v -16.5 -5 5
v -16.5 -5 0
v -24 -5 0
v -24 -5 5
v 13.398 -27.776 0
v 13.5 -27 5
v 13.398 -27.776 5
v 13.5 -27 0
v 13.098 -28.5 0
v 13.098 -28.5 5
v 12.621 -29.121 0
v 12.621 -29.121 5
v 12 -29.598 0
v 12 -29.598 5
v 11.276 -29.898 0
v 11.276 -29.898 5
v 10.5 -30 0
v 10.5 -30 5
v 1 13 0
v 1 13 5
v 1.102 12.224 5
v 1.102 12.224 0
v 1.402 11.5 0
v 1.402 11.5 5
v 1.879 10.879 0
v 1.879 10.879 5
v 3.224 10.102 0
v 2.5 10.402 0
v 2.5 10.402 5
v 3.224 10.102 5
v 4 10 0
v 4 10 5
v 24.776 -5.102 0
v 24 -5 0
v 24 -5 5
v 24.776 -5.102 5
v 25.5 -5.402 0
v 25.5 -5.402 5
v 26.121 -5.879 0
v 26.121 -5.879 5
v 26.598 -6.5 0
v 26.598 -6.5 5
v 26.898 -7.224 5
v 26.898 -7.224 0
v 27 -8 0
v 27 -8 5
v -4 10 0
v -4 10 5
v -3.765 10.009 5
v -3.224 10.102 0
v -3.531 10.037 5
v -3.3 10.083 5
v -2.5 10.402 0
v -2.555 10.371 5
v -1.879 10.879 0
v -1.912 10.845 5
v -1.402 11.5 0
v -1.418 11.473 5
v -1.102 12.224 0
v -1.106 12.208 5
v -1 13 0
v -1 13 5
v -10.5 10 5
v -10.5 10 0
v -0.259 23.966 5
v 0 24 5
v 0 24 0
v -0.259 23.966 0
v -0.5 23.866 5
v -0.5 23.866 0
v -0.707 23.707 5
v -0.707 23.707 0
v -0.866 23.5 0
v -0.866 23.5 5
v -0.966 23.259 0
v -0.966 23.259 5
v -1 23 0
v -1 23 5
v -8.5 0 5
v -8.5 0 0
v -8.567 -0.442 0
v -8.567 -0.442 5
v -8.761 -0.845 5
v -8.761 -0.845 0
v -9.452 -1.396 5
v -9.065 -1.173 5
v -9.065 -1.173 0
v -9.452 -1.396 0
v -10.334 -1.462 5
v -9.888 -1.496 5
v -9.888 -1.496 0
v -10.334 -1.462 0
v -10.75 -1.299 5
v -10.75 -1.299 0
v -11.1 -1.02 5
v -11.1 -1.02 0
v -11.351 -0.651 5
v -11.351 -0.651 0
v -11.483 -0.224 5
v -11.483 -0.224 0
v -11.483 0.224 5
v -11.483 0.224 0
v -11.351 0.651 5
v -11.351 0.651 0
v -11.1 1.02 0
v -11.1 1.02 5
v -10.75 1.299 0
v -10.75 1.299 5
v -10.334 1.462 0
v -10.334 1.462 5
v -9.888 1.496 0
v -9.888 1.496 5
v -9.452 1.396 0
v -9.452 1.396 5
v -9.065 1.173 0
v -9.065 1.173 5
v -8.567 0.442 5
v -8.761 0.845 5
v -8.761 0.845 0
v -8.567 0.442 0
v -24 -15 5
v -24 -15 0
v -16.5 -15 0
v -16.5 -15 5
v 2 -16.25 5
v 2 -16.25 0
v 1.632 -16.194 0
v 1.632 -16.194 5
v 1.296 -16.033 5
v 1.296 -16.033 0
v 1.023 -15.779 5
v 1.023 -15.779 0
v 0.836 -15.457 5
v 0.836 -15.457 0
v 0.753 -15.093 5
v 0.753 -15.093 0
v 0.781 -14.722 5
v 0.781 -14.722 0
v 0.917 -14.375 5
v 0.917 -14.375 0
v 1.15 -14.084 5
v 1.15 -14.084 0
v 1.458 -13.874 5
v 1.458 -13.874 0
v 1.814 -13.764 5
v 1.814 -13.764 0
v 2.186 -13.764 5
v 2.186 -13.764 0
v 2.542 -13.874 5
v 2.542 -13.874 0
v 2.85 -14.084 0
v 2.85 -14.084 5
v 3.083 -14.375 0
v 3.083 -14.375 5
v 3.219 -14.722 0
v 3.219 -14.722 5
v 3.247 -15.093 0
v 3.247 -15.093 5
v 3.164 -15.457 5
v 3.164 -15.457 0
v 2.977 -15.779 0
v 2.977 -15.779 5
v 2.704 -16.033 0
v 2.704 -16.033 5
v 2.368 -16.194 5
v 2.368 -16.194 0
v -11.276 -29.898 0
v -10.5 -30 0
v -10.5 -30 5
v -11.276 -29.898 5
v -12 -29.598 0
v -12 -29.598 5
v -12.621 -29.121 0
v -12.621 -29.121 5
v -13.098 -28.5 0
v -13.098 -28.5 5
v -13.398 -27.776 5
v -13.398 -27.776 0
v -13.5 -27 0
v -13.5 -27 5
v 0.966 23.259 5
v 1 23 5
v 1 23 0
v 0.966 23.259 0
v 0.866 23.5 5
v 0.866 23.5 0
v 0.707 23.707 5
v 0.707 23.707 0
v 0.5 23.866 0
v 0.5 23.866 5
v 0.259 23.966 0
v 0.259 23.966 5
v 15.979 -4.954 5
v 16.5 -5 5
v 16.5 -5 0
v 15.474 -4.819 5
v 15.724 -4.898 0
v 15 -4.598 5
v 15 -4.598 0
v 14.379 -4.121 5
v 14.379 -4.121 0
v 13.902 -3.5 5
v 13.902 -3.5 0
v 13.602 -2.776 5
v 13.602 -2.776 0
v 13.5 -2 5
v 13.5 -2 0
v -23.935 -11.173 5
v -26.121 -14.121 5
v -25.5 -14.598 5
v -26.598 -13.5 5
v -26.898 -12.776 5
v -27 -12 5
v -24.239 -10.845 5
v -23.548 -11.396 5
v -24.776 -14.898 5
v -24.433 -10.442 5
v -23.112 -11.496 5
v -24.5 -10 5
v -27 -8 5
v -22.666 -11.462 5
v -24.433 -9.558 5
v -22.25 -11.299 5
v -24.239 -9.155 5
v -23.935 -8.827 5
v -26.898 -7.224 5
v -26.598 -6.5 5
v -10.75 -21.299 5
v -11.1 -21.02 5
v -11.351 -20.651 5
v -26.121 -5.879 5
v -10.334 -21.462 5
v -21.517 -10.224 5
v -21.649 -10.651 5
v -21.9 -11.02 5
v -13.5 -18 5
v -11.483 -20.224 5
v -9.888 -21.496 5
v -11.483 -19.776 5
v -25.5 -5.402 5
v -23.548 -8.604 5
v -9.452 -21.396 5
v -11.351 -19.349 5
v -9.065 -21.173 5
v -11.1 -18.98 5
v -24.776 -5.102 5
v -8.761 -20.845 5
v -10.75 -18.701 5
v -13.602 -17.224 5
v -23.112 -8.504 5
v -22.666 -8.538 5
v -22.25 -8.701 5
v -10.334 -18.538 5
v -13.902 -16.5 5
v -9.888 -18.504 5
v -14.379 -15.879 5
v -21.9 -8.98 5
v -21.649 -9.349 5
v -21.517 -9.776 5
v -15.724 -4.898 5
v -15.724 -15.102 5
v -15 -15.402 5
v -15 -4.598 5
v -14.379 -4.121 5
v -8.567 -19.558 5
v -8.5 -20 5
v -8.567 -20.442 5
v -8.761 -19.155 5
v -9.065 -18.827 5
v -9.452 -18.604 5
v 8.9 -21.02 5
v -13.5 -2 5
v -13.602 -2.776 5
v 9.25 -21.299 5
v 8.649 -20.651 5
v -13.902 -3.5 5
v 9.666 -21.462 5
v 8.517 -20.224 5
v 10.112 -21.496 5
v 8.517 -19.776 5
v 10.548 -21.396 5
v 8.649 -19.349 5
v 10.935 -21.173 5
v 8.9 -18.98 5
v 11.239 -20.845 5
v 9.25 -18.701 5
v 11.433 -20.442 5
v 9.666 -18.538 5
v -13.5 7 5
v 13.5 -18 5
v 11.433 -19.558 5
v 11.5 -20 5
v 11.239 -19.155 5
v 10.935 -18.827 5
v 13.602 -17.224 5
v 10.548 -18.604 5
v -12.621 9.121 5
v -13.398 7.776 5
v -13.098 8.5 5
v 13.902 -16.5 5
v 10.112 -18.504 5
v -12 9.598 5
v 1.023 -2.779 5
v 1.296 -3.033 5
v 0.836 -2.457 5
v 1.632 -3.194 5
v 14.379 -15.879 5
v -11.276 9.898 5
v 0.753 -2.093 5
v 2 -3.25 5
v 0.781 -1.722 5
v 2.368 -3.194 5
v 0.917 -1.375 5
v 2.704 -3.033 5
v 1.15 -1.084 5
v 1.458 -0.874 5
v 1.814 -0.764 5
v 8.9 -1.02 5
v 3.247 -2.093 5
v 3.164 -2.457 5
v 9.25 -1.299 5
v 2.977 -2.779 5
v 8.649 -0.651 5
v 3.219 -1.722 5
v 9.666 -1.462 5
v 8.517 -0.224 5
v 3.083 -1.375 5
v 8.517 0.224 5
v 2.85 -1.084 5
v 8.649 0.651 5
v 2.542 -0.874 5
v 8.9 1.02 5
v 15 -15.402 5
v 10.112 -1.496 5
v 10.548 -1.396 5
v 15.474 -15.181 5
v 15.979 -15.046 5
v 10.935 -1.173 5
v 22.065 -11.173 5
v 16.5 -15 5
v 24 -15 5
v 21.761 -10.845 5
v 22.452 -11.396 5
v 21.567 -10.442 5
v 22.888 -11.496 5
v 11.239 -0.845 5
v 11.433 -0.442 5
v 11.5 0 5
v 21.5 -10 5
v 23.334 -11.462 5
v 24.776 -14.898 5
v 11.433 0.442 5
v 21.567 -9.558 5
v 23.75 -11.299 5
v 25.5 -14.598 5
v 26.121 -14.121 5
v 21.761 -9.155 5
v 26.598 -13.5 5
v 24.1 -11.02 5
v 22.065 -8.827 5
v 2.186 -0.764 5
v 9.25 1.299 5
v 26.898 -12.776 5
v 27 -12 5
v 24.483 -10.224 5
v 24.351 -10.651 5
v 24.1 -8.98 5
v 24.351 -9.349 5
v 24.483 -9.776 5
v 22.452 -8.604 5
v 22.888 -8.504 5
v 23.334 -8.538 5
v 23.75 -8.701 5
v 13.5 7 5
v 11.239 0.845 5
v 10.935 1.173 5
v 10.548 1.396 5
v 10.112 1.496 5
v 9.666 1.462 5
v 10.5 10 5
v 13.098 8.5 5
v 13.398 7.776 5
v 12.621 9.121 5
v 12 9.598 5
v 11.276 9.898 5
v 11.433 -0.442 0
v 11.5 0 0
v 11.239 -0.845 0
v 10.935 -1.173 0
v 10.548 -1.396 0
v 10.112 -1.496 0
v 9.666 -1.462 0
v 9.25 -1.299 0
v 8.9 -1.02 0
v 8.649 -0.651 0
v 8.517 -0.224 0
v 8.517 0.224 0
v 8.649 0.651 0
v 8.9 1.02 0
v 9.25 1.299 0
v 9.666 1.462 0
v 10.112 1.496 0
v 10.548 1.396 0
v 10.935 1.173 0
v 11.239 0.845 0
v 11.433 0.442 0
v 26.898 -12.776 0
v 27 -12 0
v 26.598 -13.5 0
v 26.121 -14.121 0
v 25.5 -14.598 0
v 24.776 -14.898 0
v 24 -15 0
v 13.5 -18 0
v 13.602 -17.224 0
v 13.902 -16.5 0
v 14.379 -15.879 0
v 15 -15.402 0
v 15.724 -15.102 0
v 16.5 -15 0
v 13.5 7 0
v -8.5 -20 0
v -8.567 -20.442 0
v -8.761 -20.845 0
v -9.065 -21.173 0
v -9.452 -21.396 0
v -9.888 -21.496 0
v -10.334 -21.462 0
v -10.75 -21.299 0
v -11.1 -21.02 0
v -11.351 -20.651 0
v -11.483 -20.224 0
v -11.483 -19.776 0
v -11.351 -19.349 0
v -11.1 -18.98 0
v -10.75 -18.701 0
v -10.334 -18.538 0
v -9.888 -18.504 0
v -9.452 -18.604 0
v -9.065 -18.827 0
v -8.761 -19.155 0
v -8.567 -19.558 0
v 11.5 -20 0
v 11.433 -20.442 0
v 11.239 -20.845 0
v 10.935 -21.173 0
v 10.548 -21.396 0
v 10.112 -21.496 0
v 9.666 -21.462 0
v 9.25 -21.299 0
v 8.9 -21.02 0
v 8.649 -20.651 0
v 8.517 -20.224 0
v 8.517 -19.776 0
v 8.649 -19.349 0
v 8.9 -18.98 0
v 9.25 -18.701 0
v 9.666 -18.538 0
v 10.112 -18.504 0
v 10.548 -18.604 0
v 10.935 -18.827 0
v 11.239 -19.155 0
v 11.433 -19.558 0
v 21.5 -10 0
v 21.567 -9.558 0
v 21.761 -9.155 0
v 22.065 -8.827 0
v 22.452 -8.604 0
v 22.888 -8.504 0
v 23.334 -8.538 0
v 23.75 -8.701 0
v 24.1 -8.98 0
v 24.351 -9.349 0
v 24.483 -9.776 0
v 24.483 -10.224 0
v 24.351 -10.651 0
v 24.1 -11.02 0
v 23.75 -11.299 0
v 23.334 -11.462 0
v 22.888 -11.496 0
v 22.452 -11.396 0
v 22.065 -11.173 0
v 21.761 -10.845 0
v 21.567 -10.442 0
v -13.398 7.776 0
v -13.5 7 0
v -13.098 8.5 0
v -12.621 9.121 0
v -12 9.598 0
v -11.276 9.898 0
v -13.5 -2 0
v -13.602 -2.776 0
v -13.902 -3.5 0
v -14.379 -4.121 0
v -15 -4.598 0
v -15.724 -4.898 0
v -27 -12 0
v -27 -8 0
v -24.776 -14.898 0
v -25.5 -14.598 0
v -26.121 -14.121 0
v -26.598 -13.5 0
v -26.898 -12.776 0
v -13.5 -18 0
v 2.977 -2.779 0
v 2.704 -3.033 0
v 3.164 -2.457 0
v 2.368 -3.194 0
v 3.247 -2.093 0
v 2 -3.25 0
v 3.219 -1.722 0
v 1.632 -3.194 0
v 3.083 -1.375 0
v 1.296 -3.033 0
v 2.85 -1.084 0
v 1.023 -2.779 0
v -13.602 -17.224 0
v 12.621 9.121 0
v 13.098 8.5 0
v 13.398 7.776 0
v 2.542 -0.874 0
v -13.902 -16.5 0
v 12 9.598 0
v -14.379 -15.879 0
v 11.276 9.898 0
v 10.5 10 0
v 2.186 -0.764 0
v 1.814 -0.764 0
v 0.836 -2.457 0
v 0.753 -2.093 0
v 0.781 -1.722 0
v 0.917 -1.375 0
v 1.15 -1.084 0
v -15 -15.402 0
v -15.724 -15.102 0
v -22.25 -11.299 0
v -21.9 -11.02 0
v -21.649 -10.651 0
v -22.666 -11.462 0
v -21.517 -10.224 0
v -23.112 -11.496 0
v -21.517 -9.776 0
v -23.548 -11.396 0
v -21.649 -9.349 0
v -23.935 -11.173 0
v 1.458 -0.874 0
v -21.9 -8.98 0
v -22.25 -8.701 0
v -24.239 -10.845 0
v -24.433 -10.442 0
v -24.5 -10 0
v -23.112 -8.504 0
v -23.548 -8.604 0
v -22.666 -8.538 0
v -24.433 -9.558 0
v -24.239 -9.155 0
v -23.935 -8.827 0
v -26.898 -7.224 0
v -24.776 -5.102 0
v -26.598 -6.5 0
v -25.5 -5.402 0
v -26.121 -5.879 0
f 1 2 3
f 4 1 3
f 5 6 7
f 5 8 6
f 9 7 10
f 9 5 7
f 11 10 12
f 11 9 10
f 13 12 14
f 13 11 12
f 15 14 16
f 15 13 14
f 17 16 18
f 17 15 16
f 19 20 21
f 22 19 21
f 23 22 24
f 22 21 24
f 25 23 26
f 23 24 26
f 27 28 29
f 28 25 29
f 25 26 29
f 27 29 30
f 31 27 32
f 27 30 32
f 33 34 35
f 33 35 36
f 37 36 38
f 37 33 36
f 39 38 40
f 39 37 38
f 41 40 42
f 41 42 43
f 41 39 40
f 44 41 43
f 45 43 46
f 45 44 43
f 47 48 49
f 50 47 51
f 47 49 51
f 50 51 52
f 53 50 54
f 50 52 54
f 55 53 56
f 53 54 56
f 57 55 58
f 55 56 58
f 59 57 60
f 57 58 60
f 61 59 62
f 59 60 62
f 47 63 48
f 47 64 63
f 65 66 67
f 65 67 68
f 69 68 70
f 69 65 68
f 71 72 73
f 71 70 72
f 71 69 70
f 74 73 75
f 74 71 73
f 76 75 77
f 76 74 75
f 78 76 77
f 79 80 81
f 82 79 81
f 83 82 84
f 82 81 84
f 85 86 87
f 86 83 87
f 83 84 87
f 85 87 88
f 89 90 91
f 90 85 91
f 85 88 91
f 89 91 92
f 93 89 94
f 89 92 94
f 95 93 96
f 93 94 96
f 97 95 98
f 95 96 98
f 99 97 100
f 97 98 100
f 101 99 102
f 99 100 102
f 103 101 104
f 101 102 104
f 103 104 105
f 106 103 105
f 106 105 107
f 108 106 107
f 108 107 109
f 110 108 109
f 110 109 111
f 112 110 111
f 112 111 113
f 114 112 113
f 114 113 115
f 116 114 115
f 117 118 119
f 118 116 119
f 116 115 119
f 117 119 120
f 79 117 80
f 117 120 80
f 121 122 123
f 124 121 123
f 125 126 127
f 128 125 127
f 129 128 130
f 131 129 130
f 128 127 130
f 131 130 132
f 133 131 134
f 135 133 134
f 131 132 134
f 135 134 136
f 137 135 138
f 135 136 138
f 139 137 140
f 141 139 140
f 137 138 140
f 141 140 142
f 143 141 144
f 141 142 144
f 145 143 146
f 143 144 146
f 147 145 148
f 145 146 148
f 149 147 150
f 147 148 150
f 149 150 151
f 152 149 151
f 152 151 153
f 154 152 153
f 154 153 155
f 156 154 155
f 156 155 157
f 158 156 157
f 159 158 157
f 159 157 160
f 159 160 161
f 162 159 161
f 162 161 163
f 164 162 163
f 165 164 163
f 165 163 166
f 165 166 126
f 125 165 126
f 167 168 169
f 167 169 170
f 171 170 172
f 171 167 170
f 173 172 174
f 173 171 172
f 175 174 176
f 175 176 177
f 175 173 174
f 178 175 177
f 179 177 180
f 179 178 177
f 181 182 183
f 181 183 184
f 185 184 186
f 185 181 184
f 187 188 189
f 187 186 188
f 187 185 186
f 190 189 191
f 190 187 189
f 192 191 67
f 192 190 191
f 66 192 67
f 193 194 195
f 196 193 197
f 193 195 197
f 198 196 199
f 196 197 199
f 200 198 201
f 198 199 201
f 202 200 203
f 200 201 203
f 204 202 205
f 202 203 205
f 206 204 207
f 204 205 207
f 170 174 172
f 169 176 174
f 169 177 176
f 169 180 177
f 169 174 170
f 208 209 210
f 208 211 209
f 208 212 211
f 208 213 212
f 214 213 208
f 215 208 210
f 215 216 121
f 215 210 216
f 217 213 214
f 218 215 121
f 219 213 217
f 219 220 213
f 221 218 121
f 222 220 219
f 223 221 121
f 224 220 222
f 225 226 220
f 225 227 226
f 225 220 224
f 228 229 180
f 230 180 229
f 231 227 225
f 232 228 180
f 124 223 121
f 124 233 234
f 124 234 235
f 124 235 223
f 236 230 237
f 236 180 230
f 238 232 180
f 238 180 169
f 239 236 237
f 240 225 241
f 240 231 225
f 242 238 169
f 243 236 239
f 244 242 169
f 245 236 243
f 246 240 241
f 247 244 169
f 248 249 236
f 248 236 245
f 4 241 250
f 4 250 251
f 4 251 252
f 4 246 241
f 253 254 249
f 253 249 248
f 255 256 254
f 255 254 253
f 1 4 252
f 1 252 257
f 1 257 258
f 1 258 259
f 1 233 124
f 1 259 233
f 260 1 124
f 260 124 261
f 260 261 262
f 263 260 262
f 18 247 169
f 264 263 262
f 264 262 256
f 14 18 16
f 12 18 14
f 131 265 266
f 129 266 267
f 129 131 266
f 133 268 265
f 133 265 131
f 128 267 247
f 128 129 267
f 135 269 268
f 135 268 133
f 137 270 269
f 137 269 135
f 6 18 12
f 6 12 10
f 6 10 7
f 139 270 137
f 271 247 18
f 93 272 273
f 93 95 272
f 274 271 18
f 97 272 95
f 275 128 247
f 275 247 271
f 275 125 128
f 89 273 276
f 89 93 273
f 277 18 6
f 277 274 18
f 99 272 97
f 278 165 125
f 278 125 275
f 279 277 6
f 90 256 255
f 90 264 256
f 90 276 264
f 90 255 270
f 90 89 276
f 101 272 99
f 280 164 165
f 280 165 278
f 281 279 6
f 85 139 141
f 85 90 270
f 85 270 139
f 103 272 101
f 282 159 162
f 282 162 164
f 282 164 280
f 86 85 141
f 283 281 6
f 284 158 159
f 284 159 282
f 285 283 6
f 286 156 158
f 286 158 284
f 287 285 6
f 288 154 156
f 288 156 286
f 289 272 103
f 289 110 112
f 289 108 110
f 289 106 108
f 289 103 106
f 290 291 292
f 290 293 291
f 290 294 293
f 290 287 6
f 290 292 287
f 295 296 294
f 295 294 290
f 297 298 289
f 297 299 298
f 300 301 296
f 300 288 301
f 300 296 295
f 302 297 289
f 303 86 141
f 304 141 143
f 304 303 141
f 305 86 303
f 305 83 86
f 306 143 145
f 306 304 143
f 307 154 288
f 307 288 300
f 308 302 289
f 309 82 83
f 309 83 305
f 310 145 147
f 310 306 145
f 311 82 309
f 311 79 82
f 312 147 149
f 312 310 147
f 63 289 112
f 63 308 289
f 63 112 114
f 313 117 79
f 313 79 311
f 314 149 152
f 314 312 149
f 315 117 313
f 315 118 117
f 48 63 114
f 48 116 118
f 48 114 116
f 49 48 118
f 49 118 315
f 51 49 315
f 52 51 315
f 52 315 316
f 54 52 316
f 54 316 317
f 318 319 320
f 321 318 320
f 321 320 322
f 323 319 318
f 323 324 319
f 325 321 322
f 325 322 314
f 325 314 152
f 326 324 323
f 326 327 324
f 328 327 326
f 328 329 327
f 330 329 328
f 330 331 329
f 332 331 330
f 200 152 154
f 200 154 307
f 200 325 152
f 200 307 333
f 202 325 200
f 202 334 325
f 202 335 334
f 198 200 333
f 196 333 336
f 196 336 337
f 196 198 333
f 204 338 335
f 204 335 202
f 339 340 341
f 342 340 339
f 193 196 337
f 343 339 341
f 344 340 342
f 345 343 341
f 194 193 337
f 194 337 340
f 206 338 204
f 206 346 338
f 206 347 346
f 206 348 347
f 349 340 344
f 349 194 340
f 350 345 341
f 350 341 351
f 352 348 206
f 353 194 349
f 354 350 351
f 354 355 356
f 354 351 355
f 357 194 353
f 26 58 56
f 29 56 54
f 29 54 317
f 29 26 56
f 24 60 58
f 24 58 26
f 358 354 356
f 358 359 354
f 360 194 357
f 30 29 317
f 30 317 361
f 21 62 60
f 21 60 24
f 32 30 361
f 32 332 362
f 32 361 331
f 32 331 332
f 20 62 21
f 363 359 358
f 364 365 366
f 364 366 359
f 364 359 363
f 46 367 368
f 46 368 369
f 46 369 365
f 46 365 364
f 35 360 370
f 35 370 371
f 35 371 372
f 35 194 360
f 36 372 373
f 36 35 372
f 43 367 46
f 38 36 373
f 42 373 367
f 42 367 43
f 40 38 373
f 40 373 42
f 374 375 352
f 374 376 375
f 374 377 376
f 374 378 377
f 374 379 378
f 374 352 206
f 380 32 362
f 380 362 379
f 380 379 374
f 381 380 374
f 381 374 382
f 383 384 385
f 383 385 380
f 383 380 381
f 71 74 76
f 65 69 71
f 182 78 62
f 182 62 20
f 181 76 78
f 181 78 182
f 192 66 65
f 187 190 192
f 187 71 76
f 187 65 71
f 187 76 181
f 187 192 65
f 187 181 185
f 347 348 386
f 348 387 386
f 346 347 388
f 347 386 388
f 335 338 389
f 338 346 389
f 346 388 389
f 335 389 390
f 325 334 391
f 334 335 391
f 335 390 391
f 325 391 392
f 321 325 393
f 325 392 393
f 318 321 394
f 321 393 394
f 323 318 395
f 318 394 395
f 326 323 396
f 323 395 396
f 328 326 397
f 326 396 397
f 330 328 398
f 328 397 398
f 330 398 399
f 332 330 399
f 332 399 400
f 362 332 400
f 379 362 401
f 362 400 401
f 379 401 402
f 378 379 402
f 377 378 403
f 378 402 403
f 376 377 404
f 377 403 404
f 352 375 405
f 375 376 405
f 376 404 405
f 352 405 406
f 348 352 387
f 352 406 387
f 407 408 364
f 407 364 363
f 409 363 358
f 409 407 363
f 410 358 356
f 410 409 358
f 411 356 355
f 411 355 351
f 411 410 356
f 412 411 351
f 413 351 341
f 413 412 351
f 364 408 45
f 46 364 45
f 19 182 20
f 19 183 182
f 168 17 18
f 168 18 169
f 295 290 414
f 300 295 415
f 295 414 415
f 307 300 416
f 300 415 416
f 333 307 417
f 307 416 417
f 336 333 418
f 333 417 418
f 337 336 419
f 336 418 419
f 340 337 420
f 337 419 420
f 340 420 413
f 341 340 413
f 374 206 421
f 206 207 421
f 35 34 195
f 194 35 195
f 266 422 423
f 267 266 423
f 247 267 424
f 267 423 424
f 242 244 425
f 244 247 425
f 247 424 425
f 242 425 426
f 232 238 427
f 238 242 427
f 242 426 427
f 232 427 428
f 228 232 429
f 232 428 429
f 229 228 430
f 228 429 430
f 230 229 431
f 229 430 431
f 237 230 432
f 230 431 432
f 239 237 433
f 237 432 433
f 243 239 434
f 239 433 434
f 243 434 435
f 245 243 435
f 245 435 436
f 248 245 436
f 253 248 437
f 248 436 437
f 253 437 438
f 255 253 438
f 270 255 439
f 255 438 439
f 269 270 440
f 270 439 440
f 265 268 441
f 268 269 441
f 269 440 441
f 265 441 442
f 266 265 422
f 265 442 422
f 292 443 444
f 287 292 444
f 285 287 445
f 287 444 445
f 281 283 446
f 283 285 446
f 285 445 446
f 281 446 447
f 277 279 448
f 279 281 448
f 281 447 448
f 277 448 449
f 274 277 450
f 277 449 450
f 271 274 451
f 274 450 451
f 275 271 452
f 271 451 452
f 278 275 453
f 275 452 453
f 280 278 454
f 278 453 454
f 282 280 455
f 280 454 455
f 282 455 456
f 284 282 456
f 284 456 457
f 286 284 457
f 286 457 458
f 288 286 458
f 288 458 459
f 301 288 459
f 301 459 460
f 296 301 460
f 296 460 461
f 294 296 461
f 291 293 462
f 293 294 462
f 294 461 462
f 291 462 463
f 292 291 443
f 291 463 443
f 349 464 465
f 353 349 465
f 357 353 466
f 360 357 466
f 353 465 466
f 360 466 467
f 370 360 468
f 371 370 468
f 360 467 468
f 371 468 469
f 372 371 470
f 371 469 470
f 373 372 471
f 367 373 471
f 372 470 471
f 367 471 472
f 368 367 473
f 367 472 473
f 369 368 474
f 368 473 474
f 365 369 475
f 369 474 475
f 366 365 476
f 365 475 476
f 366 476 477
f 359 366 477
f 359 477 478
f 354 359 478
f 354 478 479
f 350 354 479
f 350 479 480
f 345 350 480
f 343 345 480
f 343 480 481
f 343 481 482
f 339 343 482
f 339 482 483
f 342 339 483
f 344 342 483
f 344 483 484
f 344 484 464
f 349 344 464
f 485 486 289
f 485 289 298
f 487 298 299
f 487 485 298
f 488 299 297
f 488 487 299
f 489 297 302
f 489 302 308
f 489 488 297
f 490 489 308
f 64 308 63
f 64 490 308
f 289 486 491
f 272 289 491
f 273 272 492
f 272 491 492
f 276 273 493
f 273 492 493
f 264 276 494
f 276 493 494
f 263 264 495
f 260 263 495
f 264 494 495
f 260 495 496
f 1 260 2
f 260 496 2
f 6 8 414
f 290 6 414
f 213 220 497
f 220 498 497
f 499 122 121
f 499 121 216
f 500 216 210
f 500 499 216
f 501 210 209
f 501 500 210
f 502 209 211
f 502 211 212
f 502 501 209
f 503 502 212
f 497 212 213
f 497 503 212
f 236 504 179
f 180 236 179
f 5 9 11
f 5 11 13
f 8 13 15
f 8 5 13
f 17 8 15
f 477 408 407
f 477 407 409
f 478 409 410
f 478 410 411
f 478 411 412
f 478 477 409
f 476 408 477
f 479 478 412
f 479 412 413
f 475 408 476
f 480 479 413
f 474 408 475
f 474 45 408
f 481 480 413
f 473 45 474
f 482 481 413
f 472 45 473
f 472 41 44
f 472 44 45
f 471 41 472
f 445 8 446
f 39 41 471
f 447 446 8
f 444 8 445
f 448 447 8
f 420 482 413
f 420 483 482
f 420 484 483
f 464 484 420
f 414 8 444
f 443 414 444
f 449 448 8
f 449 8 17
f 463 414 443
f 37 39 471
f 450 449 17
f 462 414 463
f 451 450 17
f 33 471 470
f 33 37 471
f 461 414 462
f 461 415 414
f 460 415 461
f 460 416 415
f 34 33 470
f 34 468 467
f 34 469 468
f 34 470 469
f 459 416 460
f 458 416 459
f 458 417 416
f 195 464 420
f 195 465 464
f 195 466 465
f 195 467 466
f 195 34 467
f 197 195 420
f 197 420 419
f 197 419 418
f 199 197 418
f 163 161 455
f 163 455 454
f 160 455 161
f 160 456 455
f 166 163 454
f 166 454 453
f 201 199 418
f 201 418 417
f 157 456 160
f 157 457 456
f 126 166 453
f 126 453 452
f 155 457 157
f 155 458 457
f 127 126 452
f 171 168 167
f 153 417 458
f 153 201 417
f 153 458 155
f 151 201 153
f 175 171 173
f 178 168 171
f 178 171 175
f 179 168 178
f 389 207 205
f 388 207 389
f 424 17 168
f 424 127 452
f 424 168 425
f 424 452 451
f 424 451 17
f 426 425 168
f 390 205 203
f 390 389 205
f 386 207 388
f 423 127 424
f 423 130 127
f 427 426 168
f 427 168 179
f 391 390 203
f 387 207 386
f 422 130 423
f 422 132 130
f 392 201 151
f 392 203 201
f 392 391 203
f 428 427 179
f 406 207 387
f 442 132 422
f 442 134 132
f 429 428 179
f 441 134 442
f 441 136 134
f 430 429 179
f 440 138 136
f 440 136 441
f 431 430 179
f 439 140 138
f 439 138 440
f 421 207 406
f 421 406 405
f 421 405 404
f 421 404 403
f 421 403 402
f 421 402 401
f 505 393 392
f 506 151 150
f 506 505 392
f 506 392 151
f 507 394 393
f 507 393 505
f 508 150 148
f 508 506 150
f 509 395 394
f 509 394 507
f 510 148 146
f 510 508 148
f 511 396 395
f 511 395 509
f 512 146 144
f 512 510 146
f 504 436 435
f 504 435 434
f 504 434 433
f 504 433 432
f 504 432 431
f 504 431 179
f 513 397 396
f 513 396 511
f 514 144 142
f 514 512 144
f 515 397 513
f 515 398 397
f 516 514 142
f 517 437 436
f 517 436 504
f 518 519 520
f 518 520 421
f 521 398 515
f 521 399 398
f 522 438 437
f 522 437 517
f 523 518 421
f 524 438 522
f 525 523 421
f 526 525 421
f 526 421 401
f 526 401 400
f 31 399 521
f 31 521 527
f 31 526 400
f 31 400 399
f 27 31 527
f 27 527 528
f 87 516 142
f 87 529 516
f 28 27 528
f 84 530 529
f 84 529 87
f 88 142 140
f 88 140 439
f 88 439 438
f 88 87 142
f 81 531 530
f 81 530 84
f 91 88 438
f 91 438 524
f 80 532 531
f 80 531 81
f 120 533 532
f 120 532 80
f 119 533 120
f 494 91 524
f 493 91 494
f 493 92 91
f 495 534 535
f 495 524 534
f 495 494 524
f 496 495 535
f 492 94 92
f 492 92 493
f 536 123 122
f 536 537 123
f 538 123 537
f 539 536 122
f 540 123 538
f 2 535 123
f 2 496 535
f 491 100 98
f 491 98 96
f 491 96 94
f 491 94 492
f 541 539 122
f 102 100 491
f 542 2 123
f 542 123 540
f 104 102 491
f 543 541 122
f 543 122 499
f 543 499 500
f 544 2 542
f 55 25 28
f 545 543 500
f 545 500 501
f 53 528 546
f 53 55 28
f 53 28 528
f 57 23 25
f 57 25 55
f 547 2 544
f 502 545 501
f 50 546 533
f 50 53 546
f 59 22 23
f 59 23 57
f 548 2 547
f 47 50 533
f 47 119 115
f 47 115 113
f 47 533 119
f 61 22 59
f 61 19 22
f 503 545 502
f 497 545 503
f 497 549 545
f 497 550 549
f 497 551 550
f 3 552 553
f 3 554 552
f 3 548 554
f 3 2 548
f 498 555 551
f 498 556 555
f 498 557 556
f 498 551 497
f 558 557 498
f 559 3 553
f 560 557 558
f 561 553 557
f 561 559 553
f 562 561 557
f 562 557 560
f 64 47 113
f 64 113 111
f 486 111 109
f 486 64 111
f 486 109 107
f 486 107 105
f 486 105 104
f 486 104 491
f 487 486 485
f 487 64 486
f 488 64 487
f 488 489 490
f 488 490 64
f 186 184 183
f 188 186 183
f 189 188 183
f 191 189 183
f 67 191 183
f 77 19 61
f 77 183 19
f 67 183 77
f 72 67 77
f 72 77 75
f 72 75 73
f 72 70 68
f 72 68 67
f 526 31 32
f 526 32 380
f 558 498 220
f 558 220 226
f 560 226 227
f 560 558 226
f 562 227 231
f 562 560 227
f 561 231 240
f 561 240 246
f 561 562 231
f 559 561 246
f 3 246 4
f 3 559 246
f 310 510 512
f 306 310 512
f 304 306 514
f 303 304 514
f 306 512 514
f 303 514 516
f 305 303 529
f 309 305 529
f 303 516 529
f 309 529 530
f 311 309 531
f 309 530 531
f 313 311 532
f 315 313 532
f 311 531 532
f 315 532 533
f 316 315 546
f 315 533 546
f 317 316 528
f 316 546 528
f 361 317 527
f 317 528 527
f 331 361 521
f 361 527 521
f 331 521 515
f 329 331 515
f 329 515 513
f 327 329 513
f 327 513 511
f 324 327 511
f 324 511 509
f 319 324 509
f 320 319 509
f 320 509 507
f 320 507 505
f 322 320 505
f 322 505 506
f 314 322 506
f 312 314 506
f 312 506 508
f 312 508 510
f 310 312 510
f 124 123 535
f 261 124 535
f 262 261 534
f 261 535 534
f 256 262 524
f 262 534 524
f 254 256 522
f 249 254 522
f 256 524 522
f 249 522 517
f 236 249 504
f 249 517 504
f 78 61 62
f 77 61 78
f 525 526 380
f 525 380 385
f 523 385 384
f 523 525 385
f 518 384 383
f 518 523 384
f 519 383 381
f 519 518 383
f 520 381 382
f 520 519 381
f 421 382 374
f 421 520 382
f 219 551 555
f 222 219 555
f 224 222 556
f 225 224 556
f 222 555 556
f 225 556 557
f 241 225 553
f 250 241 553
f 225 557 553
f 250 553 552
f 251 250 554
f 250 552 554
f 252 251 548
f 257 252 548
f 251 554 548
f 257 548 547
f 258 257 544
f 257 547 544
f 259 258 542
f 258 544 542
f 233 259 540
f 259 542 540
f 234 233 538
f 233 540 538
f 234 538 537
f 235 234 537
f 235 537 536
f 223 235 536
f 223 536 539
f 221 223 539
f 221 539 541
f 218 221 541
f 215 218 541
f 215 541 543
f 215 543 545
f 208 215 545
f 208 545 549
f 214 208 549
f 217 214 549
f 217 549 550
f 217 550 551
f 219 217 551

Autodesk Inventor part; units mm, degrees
ref_plane "YZ Plane" through (0, 0, 0) normal (1, 0, 0) x (0, 1, 0)
ref_plane "XZ Plane" through (0, 0, 0) normal (0, 1, 0) x (-1, 0, 0)
ref_plane "XY Plane" through (0, 0, 0) normal (0, 0, 1) x (1, 0, 0)
sketch "Sketch1" plane through (0, 0, 0) normal (0, 0, 1) x (1, 0, 0)
  circle A0 centre (-10, 0) radius 1.5
  circle A1 centre (10, 0) radius 1.5
  circle A2 centre (-10, -20) radius 1.5
  circle A3 centre (10, -20) radius 1.5
  line L0 (-15, 10) -> (15, 10)
  line L1 (15, 10) -> (15, -30)
  line L2 (15, -30) -> (-15, -30)
  line L3 (-15, -30) -> (-15, 10)
  point P0 (0, 0)
  dimension "d0" = 3
  dimension "d1" = 3
  dimension "d2" = 20
  dimension "d3" = 10
  dimension "d4" = 3
  dimension "d5" = 3
  dimension "d6" = 20
  dimension "d7" = 20
  dimension "d8" = 20
  dimension "d9" = 10
  dimension "d10" = 30
  dimension "d11" = 15
  dimension "d12" = 40
  dimension "d13" = 10
extrude "Extrusion1" add sketch "Sketch1" along normal blind 5
sketch "Sketch2" plane through (0, 0, 5) normal (0, 0, 1) x (1, 0, 0)
  line L0 (0, 15.442053) -> (0, -37.541934) construction
  line L1 (-4, 15.442053) -> (-4, -37.541934) construction
  line L2 (-15, -30) -> (15, -30) construction
  line L3 (15, 10) -> (-15, 10)
  line L4 (15, -30) -> (15, 10)
  line L5 (7, 10) -> (7, -30)
  line L6 (7, 10) -> (15, 10)
  line L7 (7, -30) -> (15, -30)
  line L8 (6.3, 15.442053) -> (6.3, 10) construction
  line L9 (6.3, -30) -> (6.3, -37.541934) construction
  line L10 (-15, 10) -> (-15, -30)
  line L11 (15, -30) -> (15, 10)
  point P0 (0, 0)
  dimension "d16" = 4
  dimension "d96" = 0
  dimension "d97" = 0
  dimension "d141" = 22
  dimension "d152" = 0
extrude "Extrusion2" add sketch "Sketch2" along normal blind 10
sketch "Sketch4" plane through (0, 0, 15) normal (0, 0, 1) x (1, 0, 0)
  circle A0 centre (10, 0) radius 3.25
  circle A1 centre (10, -20) radius 1.5 projected
  circle A2 centre (10, -20) radius 3.25
  point P0 (0, 0)
  point P1 (8.5, 0)
  point P2 (8.5, -20)
  dimension "d37" = 6.5
  dimension "d38" = 6.5
extrude "Extrusion3" [suppressed]
sketch "Sketch5" plane through (0, 0, 5) normal (0, 0, 1) x (1, 0, 0)
  line L0 (-4, 15.442053) -> (-4, -37.541934) construction
  line L1 (15, -30) -> (-15, -30)
  line L2 (7, 10) -> (-15, 10)
  line L3 (-3.3, 10) -> (1, 10)
  line L4 (4.5, -30) -> (-3.3, -30)
  line L5 (-3.3, -30) -> (-3.3, 10)
  line L6 (-2, 6) -> (1, 6)
  line L7 (4.5, -26) -> (-2, -26)
  line L8 (-2, -26) -> (-2, 6)
  line L9 (1, 10) -> (1, 6)
  line L10 (4.5, -26) -> (4.5, -30)
  line L11 (7, 10) -> (7, -30)
  point P0 (0, 0)
  point P1 (6.3, 10)
  point P2 (6.3, -30)
  point P3 (15, 10)
  dimension "d111" = 0.7
  dimension "d112" = 4
  dimension "d115" = 4
  dimension "d116" = 1.3
  dimension "d117" = 6
  dimension "d118" = 2.5
  dimension "d139" = 0
  dimension "d140" = 0
extrude "Extrusion4" add sketch "Sketch5" along normal up to surface (10 mm away) contours L1 L5 L2 L9 L6 L8 L7 L10
sketch "Sketch8" plane through (0, 0, 0) normal (0, 0, -1) x (-1, 0, 0)
  line L0 (27, -15) -> (-27, -15)
  line L1 (-27, -15) -> (-27, -5)
  line L2 (-27, -5) -> (27, -5)
  line L3 (27, -5) -> (27, -15)
  line L4 (15, 10) -> (-15, 10) projected
  line L5 (-15, -30) -> (15, -30) projected
  circle A0 centre (23, -10) radius 1.5
  circle A1 centre (-23, -10) radius 1.5
  point P0 (0, 0)
  dimension "d77" = 10
  dimension "d78" = 40
  dimension "d79" = 15
  dimension "d80" = 3
  dimension "d81" = 3
  dimension "d82" = 46
  dimension "d83" = 54
  dimension "d84" = 23
  dimension "d85" = 27
extrude "Extrusion5" add sketch "Sketch8" against normal up to surface (5 mm away)
sketch "Sketch3" plane through (0, 0, 5) normal (0, 0, 1) x (1, 0, 0)
  circle A0 centre (2, -2) radius 1.25
  circle A1 centre (2, -15) radius 1.25
  line L0 (-15, -30) -> (15, -30) projected
  line L1 (15, 10) -> (-15, 10) projected
  point P0 (0, 0)
  point P1 (7, -30)
  point P2 (6.3, 10)
  dimension "d23" = 2.5
  dimension "d24" = 2.5
  dimension "d25" = 15
  dimension "d26" = 2
  dimension "d27" = 2
  dimension "d28" = 12
hole "Hole1" at (2, -2, 5) at (2, -15, 5) direction (0, 0, -1) diameter 2.5 end through all
fillet "Fillet5" [suppressed]
fillet "Fillet7" [suppressed]
sketch "Sketch11" plane through (0, 0, 0) normal (0, 0, -1) x (-1, 0, 0)
  line L0 (15, -15) -> (13.5, -15)
  line L1 (13.5, -5) -> (15, -5)
  line L2 (-15, -5) -> (-13.5, -5)
  line L3 (-13.5, -15) -> (-15, -15)
  line L4 (15, -30) -> (15, -15)
  line L5 (-15, -15) -> (-15, -30)
  line L6 (-15, 10) -> (-15, -5)
  line L7 (15, -5) -> (15, 10)
  line L8 (-15, -30) -> (-13.5, -30)
  line L9 (13.5, -30) -> (15, -30)
  line L10 (-13.5, -30) -> (-13.5, -15)
  line L11 (-13.5, -5) -> (-13.5, 10)
  line L12 (13.5, 10) -> (13.5, -5)
  line L13 (13.5, -15) -> (13.5, -30)
  line L14 (15, 10) -> (13.5, 10)
  line L15 (-15, 10) -> (15, 10) projected
  line L16 (-15, 10) -> (-13.5, 10)
  point P0 (0, 0)
  dimension "d121" = 27
extrude "Extrusion7" cut sketch "Sketch11" against normal through all
fillet "Fillet9" radius 3 12 edges at (-27, -15, 2.5) (-13.5, -30, 2.5) (13.5, -30, 7.5) (-27, -5, 2.5) (-13.5, -5, 2.5) (-13.5, 10, 2.5) (13.5, -15, 7.5) (27, -15, 2.5) (27, -5, 2.5) (13.5, -5, 7.5) (13.5, 10, 7.5) (-13.5, -15, 2.5)
sketch "Sketch12" plane through (4, -30, 4) normal (0, -1, 0) x (1, 0, 0)
  line L0 (0.5, 11) -> (-7.3, 11) projected
  circle A0 centre (-2, 3) radius 1.5
  line L1 (0.5, 1) -> (3, 1) projected
  line L2 (6.5, -4) -> (-14.5, -4) projected
  line L3 (6.5, 11) -> (6.5, -4) projected
  line L4 (-14.5, -4) -> (-14.5, 1) projected
  line L5 (-7.3, 1) -> (-7.3, 11) projected
  line L6 (-14.5, 1) -> (-7.3, 1) projected
  line L7 (3, 11) -> (6.5, 11) projected
  line L8 (3, 1) -> (3, 11) projected
  line L9 (0.5, 1) -> (0.5, 11) projected
  point P0 (-4, -4)
  dimension "d126" = 3
  dimension "d129" = 3
extrude "Extrusion8" [suppressed]
sketch "Sketch14" plane through (0, 0, 0) normal (0, 0, -1) x (-1, 0, 0)
  line L0 (10.5, 10) -> (-10.5, 10) projected
  line L1 (-1, 10) -> (1, 10)
  line L2 (1, 10) -> (1, 24)
  line L3 (1, 24) -> (-1, 24)
  line L4 (-1, 24) -> (-1, 10)
  point P0 (0, 0)
  dimension "d142" = 14
  dimension "d143" = 1
  dimension "d144" = 1
extrude "Extrusion10" add sketch "Sketch14" against normal up to surface (15 mm away)
fillet "Fillet10" radius 3 2 edges at (-1, 10, 7.5) (1, 10, 2.5)
fillet "Fillet11" radius 1 2 edges at (-1, 24, 7.5) (1, 24, 7.5)
sketch "Sketch15" plane through (-3.3, -30, 15) normal (0, 0, 1) x (1, 0, 0)
  arc A0 (2.3, 53) -> (4.3, 53) centre (3.3, 53) ccw
  line L0 (2.3, 43) -> (2.3, 53)
  arc A1 (0, 40.08281) -> (2.3, 43) centre (-0.7, 43) ccw
  line L1 (0, 0) -> (0, 36)
  line L2 (7.8, 0) -> (0, 0)
  line L3 (7.8, 4) -> (7.8, 0)
  line L4 (1.3, 4) -> (7.8, 4)
  line L5 (1.3, 36) -> (1.3, 4)
  line L6 (4.3, 36) -> (1.3, 36)
  line L7 (4.3, 53) -> (4.3, 36)
  line L8 (7.3, 40) -> (7.8, 40)
  arc A2 (4.3, 43) -> (6.8, 40.04196) centre (7.3, 43) ccw
  line L9 (4.3, 53) -> (4.3, 36)
  line L10 (1.3, 36) -> (1.3, 4)
  line L11 (1.3, 36) -> (0, 36)
  line L12 (0, 0) -> (0, 36)
  point P0 (3.3, 30)
extrude "Extrusion11" cut sketch "Sketch15" against normal up to surface (10 mm away)
sketch "Sketch16" plane through (10, 0, 5) normal (0, 0, -1) x (-1, 0, 0)
  circle A0 centre (0, 0) radius 1.5 projected
  circle A1 centre (0, -20) radius 1.5 projected
  point P0 (10, 0)
extrude "Extrusion12" cut sketch "Sketch16" against normal through all
sketch "Sketch17" plane through (-3.3, 6, 15) normal (0, 0, 1) x (1, 0, 0)
  line L0 (4.3, 0) -> (0, 0)
  line L1 (4.3, 17) -> (4.3, 0)
  arc A0 (4.3, 17) -> (2.3, 17) centre (3.3, 17) ccw
  line L2 (2.3, 7) -> (2.3, 17)
  arc A1 (0, 4.08281) -> (2.3, 7) centre (-0.7, 7) ccw
  line L3 (0, 0) -> (0, 4.08281)
  point P0 (3.3, -6)
sketch "Sketch17 outline for Extrusion13" plane through (-3.3, 6, 15) normal (0, 0, 1) x (1, 0, 0)
  line L0 (0, 4.08281) -> (0, 0)
  arc A0 (2.3, 7) -> (0, 4.08281) centre (-0.7, 7) cw
  line L1 (2.3, 17) -> (2.3, 7)
  arc A1 (4.3, 17) -> (2.3, 17) centre (3.3, 17) ccw
  line L2 (4.3, 0) -> (4.3, 17)
  line L3 (0, 0) -> (4.3, 0)
extrude "Extrusion13" cut sketch "Sketch17 outline for Extrusion13" against normal up to surface (10 mm away)
sketch "Sketch18" plane through (0, 0, 15) normal (0, 0, 1) x (1, 0, 0)
  circle A0 centre (10, 0) radius 1.5
  circle A1 centre (10, -20) radius 1.5
  arc A2 (13.5, 7) -> (10.5, 10) centre (10.5, 7) ccw
  line L0 (10.5, 10) -> (7, 10)
  line L1 (7, 10) -> (7, -30)
  line L2 (7, -30) -> (10.5, -30)
  arc A3 (10.5, -30) -> (13.5, -27) centre (10.5, -27) ccw
  line L3 (13.5, -27) -> (13.5, -18)
  arc A4 (15, -15.401924) -> (13.5, -18) centre (16.5, -18) ccw
  line L4 (15, -4.598076) -> (15, -15.401924)
  arc A5 (13.5, -2) -> (15, -4.598076) centre (16.5, -2) ccw
  line L5 (13.5, -2) -> (13.5, 7)
  point P0 (0, 0)
extrude "Extrusion14" cut sketch "Sketch18" against normal up to surface (10 mm away)
sketch "Sketch13" plane through (-10.5, -30, 0) normal (0, -1, 0) x (1, 0, 0)
  line L0 (21, 4) -> (21, 0) projected
  line L1 (0, 0) -> (0, 4) projected
  line L2 (21, 0) -> (0, 0) projected
  circle A0 centre (11, 8) radius 1.5
  line L3 (19.5, 4) -> (21, 4) projected
  line L4 (19.5, 4) -> (19.5, 14) projected
  line L5 (17.5, 14) -> (19.5, 14) projected
  line L6 (17.5, 4) -> (17.5, 14) projected
  line L7 (15, 4) -> (17.5, 4) projected
  line L8 (15, 4) -> (15, 14) projected
  line L9 (15, 14) -> (7.2, 14) projected
  line L10 (7.2, 4) -> (7.2, 14) projected
  line L11 (0, 4) -> (7.2, 4) projected
  point P0 (10.5, 0)
  dimension "d132" = 3
  dimension "d133" = 21
  dimension "d134" = 4
  dimension "d136" = 11
  dimension "d149" = 8
sketch "Sketch9" plane through (0, 0, 5) normal (0, 0, 1) x (1, 0, 0)
  circle A0 centre (-10, 0) radius 1.5 projected
  circle A1 centre (2, -2) radius 1.25 projected
  circle A2 centre (10, 0) radius 1.5 projected
  circle A3 centre (23, -10) radius 1.5 projected
  circle A4 centre (10, -20) radius 1.5 projected
  circle A5 centre (2, -15) radius 1.25 projected
  circle A6 centre (-10, -20) radius 1.5 projected
  circle A7 centre (-23, -10) radius 1.5 projected
  point P0 (0, 0)
equation "\"d3\" = 0.5 * d2"
equation "\"d7\" = d6"
equation "\"d8\" = d2"
equation "\"d9\" = d3"
equation "\"d11\" = 0.5 * d10"
equation "\"d13\" = -0.5 * d6 + 0.5 * d12"
equation "\"d37\" = d38"
equation "\"d115\" = d112"
equation "\"d79\" = -0.5 * d77 + 0.5 * d78"
equation "\"d84\" = 0.5 * d82"
equation "\"d85\" = 0.5 * d83"
equation "\"d27\" = d26"
properties part number "vertical carriage vasi"
